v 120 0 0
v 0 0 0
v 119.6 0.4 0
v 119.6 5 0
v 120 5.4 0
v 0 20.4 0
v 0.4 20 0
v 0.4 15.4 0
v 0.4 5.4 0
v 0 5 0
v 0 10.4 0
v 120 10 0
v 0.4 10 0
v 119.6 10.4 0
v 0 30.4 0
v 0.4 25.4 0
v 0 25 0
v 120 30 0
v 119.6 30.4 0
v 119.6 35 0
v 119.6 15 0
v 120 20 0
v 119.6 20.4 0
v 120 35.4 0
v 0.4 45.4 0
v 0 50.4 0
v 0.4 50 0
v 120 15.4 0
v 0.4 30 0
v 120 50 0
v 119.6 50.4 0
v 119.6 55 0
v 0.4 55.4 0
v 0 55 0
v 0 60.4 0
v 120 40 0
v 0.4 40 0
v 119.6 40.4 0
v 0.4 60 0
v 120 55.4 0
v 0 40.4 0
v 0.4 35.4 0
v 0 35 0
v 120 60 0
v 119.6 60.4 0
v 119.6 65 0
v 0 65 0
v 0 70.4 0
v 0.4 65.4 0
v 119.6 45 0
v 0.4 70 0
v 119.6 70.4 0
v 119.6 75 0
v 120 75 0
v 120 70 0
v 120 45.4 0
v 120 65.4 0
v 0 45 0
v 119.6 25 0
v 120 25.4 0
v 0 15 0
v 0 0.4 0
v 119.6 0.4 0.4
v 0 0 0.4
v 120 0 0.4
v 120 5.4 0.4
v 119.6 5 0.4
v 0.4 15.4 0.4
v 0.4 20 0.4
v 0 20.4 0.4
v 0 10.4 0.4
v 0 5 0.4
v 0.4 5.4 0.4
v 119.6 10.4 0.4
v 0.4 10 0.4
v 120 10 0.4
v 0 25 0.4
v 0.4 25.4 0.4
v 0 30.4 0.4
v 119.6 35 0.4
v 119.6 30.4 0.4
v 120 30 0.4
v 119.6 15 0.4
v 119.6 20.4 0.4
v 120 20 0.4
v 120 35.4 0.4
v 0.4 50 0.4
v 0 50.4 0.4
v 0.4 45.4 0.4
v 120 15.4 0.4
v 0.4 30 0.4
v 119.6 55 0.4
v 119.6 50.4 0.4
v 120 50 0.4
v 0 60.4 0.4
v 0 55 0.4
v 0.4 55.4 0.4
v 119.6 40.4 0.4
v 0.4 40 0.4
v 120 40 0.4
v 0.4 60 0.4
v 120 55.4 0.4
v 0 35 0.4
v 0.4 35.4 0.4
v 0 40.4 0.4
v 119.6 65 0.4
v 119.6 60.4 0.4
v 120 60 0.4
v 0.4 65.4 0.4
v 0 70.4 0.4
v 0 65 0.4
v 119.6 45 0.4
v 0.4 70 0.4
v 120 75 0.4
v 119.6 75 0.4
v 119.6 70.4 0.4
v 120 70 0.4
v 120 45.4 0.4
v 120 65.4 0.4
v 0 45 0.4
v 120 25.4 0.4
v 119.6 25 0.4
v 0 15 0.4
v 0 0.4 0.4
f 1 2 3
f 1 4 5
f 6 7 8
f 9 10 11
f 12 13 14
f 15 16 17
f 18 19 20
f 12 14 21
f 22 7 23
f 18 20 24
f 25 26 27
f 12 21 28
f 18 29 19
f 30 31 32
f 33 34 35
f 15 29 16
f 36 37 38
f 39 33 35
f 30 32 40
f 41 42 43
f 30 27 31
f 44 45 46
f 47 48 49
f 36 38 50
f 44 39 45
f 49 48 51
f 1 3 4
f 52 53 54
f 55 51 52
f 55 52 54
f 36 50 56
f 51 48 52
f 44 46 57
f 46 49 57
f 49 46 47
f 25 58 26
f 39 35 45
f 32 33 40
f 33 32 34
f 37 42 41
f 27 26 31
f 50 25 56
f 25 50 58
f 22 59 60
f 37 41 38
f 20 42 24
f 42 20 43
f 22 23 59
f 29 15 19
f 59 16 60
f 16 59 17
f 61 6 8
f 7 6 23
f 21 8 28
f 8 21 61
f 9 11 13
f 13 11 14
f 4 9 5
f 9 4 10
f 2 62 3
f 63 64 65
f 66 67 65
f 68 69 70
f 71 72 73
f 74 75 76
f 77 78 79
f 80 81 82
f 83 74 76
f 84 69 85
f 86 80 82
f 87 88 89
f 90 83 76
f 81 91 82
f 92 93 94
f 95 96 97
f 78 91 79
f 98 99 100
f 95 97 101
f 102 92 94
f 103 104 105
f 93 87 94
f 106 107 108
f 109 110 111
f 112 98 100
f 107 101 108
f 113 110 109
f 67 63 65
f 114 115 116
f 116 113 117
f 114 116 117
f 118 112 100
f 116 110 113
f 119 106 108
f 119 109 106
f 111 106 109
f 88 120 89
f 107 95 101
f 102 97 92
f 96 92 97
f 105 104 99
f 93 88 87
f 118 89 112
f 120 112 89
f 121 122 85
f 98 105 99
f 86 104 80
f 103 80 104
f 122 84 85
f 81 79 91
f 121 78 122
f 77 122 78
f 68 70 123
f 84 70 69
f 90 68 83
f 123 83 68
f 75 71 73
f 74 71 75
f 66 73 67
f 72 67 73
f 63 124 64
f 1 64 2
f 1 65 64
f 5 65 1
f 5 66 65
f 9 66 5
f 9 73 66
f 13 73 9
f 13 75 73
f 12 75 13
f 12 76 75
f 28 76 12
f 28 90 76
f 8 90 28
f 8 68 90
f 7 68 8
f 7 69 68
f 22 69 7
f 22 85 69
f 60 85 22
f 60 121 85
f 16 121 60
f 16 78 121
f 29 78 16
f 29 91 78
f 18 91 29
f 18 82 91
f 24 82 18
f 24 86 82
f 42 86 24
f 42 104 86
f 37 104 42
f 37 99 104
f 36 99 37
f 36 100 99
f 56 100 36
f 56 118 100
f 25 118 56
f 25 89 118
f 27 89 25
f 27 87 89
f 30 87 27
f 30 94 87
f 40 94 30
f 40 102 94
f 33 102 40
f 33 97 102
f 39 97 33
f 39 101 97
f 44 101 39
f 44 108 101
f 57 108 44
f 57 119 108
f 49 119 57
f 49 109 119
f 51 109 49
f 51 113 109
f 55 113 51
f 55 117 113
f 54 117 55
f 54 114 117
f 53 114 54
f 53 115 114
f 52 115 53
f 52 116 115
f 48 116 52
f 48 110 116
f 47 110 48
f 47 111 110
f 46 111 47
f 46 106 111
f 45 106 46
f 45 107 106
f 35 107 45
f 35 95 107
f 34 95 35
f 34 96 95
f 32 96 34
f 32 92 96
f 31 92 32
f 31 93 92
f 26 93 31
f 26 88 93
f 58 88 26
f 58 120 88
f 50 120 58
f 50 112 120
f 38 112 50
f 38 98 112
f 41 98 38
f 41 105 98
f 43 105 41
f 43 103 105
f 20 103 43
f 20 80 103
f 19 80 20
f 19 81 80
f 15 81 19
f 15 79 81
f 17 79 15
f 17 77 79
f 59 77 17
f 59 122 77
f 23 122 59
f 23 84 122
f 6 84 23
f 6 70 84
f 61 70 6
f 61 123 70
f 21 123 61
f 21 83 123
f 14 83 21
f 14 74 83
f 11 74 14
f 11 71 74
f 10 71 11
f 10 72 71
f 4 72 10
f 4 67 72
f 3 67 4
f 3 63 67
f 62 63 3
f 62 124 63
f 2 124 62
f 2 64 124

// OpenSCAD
nozzlesize = 0.4;
linewidth = nozzlesize;
height = nozzlesize;
x = 120;
y = 150;
y_step = 5;

module flat_prusatest() {
    square([x,linewidth]);
    translate([x-linewidth,linewidth])
        square([linewidth,y_step]);

    for (i = [1:2:14]) {
        translate([0,y_step*i]) {
            square([x,linewidth]);
            square([linewidth,y_step]);
        }

        translate([0,y_step*(i+1)]) {
            square([x-linewidth,linewidth]);
            translate([x-linewidth,0])
                square([linewidth,y_step]);
        }
    }
}

linear_extrude(height) flat_prusatest();
